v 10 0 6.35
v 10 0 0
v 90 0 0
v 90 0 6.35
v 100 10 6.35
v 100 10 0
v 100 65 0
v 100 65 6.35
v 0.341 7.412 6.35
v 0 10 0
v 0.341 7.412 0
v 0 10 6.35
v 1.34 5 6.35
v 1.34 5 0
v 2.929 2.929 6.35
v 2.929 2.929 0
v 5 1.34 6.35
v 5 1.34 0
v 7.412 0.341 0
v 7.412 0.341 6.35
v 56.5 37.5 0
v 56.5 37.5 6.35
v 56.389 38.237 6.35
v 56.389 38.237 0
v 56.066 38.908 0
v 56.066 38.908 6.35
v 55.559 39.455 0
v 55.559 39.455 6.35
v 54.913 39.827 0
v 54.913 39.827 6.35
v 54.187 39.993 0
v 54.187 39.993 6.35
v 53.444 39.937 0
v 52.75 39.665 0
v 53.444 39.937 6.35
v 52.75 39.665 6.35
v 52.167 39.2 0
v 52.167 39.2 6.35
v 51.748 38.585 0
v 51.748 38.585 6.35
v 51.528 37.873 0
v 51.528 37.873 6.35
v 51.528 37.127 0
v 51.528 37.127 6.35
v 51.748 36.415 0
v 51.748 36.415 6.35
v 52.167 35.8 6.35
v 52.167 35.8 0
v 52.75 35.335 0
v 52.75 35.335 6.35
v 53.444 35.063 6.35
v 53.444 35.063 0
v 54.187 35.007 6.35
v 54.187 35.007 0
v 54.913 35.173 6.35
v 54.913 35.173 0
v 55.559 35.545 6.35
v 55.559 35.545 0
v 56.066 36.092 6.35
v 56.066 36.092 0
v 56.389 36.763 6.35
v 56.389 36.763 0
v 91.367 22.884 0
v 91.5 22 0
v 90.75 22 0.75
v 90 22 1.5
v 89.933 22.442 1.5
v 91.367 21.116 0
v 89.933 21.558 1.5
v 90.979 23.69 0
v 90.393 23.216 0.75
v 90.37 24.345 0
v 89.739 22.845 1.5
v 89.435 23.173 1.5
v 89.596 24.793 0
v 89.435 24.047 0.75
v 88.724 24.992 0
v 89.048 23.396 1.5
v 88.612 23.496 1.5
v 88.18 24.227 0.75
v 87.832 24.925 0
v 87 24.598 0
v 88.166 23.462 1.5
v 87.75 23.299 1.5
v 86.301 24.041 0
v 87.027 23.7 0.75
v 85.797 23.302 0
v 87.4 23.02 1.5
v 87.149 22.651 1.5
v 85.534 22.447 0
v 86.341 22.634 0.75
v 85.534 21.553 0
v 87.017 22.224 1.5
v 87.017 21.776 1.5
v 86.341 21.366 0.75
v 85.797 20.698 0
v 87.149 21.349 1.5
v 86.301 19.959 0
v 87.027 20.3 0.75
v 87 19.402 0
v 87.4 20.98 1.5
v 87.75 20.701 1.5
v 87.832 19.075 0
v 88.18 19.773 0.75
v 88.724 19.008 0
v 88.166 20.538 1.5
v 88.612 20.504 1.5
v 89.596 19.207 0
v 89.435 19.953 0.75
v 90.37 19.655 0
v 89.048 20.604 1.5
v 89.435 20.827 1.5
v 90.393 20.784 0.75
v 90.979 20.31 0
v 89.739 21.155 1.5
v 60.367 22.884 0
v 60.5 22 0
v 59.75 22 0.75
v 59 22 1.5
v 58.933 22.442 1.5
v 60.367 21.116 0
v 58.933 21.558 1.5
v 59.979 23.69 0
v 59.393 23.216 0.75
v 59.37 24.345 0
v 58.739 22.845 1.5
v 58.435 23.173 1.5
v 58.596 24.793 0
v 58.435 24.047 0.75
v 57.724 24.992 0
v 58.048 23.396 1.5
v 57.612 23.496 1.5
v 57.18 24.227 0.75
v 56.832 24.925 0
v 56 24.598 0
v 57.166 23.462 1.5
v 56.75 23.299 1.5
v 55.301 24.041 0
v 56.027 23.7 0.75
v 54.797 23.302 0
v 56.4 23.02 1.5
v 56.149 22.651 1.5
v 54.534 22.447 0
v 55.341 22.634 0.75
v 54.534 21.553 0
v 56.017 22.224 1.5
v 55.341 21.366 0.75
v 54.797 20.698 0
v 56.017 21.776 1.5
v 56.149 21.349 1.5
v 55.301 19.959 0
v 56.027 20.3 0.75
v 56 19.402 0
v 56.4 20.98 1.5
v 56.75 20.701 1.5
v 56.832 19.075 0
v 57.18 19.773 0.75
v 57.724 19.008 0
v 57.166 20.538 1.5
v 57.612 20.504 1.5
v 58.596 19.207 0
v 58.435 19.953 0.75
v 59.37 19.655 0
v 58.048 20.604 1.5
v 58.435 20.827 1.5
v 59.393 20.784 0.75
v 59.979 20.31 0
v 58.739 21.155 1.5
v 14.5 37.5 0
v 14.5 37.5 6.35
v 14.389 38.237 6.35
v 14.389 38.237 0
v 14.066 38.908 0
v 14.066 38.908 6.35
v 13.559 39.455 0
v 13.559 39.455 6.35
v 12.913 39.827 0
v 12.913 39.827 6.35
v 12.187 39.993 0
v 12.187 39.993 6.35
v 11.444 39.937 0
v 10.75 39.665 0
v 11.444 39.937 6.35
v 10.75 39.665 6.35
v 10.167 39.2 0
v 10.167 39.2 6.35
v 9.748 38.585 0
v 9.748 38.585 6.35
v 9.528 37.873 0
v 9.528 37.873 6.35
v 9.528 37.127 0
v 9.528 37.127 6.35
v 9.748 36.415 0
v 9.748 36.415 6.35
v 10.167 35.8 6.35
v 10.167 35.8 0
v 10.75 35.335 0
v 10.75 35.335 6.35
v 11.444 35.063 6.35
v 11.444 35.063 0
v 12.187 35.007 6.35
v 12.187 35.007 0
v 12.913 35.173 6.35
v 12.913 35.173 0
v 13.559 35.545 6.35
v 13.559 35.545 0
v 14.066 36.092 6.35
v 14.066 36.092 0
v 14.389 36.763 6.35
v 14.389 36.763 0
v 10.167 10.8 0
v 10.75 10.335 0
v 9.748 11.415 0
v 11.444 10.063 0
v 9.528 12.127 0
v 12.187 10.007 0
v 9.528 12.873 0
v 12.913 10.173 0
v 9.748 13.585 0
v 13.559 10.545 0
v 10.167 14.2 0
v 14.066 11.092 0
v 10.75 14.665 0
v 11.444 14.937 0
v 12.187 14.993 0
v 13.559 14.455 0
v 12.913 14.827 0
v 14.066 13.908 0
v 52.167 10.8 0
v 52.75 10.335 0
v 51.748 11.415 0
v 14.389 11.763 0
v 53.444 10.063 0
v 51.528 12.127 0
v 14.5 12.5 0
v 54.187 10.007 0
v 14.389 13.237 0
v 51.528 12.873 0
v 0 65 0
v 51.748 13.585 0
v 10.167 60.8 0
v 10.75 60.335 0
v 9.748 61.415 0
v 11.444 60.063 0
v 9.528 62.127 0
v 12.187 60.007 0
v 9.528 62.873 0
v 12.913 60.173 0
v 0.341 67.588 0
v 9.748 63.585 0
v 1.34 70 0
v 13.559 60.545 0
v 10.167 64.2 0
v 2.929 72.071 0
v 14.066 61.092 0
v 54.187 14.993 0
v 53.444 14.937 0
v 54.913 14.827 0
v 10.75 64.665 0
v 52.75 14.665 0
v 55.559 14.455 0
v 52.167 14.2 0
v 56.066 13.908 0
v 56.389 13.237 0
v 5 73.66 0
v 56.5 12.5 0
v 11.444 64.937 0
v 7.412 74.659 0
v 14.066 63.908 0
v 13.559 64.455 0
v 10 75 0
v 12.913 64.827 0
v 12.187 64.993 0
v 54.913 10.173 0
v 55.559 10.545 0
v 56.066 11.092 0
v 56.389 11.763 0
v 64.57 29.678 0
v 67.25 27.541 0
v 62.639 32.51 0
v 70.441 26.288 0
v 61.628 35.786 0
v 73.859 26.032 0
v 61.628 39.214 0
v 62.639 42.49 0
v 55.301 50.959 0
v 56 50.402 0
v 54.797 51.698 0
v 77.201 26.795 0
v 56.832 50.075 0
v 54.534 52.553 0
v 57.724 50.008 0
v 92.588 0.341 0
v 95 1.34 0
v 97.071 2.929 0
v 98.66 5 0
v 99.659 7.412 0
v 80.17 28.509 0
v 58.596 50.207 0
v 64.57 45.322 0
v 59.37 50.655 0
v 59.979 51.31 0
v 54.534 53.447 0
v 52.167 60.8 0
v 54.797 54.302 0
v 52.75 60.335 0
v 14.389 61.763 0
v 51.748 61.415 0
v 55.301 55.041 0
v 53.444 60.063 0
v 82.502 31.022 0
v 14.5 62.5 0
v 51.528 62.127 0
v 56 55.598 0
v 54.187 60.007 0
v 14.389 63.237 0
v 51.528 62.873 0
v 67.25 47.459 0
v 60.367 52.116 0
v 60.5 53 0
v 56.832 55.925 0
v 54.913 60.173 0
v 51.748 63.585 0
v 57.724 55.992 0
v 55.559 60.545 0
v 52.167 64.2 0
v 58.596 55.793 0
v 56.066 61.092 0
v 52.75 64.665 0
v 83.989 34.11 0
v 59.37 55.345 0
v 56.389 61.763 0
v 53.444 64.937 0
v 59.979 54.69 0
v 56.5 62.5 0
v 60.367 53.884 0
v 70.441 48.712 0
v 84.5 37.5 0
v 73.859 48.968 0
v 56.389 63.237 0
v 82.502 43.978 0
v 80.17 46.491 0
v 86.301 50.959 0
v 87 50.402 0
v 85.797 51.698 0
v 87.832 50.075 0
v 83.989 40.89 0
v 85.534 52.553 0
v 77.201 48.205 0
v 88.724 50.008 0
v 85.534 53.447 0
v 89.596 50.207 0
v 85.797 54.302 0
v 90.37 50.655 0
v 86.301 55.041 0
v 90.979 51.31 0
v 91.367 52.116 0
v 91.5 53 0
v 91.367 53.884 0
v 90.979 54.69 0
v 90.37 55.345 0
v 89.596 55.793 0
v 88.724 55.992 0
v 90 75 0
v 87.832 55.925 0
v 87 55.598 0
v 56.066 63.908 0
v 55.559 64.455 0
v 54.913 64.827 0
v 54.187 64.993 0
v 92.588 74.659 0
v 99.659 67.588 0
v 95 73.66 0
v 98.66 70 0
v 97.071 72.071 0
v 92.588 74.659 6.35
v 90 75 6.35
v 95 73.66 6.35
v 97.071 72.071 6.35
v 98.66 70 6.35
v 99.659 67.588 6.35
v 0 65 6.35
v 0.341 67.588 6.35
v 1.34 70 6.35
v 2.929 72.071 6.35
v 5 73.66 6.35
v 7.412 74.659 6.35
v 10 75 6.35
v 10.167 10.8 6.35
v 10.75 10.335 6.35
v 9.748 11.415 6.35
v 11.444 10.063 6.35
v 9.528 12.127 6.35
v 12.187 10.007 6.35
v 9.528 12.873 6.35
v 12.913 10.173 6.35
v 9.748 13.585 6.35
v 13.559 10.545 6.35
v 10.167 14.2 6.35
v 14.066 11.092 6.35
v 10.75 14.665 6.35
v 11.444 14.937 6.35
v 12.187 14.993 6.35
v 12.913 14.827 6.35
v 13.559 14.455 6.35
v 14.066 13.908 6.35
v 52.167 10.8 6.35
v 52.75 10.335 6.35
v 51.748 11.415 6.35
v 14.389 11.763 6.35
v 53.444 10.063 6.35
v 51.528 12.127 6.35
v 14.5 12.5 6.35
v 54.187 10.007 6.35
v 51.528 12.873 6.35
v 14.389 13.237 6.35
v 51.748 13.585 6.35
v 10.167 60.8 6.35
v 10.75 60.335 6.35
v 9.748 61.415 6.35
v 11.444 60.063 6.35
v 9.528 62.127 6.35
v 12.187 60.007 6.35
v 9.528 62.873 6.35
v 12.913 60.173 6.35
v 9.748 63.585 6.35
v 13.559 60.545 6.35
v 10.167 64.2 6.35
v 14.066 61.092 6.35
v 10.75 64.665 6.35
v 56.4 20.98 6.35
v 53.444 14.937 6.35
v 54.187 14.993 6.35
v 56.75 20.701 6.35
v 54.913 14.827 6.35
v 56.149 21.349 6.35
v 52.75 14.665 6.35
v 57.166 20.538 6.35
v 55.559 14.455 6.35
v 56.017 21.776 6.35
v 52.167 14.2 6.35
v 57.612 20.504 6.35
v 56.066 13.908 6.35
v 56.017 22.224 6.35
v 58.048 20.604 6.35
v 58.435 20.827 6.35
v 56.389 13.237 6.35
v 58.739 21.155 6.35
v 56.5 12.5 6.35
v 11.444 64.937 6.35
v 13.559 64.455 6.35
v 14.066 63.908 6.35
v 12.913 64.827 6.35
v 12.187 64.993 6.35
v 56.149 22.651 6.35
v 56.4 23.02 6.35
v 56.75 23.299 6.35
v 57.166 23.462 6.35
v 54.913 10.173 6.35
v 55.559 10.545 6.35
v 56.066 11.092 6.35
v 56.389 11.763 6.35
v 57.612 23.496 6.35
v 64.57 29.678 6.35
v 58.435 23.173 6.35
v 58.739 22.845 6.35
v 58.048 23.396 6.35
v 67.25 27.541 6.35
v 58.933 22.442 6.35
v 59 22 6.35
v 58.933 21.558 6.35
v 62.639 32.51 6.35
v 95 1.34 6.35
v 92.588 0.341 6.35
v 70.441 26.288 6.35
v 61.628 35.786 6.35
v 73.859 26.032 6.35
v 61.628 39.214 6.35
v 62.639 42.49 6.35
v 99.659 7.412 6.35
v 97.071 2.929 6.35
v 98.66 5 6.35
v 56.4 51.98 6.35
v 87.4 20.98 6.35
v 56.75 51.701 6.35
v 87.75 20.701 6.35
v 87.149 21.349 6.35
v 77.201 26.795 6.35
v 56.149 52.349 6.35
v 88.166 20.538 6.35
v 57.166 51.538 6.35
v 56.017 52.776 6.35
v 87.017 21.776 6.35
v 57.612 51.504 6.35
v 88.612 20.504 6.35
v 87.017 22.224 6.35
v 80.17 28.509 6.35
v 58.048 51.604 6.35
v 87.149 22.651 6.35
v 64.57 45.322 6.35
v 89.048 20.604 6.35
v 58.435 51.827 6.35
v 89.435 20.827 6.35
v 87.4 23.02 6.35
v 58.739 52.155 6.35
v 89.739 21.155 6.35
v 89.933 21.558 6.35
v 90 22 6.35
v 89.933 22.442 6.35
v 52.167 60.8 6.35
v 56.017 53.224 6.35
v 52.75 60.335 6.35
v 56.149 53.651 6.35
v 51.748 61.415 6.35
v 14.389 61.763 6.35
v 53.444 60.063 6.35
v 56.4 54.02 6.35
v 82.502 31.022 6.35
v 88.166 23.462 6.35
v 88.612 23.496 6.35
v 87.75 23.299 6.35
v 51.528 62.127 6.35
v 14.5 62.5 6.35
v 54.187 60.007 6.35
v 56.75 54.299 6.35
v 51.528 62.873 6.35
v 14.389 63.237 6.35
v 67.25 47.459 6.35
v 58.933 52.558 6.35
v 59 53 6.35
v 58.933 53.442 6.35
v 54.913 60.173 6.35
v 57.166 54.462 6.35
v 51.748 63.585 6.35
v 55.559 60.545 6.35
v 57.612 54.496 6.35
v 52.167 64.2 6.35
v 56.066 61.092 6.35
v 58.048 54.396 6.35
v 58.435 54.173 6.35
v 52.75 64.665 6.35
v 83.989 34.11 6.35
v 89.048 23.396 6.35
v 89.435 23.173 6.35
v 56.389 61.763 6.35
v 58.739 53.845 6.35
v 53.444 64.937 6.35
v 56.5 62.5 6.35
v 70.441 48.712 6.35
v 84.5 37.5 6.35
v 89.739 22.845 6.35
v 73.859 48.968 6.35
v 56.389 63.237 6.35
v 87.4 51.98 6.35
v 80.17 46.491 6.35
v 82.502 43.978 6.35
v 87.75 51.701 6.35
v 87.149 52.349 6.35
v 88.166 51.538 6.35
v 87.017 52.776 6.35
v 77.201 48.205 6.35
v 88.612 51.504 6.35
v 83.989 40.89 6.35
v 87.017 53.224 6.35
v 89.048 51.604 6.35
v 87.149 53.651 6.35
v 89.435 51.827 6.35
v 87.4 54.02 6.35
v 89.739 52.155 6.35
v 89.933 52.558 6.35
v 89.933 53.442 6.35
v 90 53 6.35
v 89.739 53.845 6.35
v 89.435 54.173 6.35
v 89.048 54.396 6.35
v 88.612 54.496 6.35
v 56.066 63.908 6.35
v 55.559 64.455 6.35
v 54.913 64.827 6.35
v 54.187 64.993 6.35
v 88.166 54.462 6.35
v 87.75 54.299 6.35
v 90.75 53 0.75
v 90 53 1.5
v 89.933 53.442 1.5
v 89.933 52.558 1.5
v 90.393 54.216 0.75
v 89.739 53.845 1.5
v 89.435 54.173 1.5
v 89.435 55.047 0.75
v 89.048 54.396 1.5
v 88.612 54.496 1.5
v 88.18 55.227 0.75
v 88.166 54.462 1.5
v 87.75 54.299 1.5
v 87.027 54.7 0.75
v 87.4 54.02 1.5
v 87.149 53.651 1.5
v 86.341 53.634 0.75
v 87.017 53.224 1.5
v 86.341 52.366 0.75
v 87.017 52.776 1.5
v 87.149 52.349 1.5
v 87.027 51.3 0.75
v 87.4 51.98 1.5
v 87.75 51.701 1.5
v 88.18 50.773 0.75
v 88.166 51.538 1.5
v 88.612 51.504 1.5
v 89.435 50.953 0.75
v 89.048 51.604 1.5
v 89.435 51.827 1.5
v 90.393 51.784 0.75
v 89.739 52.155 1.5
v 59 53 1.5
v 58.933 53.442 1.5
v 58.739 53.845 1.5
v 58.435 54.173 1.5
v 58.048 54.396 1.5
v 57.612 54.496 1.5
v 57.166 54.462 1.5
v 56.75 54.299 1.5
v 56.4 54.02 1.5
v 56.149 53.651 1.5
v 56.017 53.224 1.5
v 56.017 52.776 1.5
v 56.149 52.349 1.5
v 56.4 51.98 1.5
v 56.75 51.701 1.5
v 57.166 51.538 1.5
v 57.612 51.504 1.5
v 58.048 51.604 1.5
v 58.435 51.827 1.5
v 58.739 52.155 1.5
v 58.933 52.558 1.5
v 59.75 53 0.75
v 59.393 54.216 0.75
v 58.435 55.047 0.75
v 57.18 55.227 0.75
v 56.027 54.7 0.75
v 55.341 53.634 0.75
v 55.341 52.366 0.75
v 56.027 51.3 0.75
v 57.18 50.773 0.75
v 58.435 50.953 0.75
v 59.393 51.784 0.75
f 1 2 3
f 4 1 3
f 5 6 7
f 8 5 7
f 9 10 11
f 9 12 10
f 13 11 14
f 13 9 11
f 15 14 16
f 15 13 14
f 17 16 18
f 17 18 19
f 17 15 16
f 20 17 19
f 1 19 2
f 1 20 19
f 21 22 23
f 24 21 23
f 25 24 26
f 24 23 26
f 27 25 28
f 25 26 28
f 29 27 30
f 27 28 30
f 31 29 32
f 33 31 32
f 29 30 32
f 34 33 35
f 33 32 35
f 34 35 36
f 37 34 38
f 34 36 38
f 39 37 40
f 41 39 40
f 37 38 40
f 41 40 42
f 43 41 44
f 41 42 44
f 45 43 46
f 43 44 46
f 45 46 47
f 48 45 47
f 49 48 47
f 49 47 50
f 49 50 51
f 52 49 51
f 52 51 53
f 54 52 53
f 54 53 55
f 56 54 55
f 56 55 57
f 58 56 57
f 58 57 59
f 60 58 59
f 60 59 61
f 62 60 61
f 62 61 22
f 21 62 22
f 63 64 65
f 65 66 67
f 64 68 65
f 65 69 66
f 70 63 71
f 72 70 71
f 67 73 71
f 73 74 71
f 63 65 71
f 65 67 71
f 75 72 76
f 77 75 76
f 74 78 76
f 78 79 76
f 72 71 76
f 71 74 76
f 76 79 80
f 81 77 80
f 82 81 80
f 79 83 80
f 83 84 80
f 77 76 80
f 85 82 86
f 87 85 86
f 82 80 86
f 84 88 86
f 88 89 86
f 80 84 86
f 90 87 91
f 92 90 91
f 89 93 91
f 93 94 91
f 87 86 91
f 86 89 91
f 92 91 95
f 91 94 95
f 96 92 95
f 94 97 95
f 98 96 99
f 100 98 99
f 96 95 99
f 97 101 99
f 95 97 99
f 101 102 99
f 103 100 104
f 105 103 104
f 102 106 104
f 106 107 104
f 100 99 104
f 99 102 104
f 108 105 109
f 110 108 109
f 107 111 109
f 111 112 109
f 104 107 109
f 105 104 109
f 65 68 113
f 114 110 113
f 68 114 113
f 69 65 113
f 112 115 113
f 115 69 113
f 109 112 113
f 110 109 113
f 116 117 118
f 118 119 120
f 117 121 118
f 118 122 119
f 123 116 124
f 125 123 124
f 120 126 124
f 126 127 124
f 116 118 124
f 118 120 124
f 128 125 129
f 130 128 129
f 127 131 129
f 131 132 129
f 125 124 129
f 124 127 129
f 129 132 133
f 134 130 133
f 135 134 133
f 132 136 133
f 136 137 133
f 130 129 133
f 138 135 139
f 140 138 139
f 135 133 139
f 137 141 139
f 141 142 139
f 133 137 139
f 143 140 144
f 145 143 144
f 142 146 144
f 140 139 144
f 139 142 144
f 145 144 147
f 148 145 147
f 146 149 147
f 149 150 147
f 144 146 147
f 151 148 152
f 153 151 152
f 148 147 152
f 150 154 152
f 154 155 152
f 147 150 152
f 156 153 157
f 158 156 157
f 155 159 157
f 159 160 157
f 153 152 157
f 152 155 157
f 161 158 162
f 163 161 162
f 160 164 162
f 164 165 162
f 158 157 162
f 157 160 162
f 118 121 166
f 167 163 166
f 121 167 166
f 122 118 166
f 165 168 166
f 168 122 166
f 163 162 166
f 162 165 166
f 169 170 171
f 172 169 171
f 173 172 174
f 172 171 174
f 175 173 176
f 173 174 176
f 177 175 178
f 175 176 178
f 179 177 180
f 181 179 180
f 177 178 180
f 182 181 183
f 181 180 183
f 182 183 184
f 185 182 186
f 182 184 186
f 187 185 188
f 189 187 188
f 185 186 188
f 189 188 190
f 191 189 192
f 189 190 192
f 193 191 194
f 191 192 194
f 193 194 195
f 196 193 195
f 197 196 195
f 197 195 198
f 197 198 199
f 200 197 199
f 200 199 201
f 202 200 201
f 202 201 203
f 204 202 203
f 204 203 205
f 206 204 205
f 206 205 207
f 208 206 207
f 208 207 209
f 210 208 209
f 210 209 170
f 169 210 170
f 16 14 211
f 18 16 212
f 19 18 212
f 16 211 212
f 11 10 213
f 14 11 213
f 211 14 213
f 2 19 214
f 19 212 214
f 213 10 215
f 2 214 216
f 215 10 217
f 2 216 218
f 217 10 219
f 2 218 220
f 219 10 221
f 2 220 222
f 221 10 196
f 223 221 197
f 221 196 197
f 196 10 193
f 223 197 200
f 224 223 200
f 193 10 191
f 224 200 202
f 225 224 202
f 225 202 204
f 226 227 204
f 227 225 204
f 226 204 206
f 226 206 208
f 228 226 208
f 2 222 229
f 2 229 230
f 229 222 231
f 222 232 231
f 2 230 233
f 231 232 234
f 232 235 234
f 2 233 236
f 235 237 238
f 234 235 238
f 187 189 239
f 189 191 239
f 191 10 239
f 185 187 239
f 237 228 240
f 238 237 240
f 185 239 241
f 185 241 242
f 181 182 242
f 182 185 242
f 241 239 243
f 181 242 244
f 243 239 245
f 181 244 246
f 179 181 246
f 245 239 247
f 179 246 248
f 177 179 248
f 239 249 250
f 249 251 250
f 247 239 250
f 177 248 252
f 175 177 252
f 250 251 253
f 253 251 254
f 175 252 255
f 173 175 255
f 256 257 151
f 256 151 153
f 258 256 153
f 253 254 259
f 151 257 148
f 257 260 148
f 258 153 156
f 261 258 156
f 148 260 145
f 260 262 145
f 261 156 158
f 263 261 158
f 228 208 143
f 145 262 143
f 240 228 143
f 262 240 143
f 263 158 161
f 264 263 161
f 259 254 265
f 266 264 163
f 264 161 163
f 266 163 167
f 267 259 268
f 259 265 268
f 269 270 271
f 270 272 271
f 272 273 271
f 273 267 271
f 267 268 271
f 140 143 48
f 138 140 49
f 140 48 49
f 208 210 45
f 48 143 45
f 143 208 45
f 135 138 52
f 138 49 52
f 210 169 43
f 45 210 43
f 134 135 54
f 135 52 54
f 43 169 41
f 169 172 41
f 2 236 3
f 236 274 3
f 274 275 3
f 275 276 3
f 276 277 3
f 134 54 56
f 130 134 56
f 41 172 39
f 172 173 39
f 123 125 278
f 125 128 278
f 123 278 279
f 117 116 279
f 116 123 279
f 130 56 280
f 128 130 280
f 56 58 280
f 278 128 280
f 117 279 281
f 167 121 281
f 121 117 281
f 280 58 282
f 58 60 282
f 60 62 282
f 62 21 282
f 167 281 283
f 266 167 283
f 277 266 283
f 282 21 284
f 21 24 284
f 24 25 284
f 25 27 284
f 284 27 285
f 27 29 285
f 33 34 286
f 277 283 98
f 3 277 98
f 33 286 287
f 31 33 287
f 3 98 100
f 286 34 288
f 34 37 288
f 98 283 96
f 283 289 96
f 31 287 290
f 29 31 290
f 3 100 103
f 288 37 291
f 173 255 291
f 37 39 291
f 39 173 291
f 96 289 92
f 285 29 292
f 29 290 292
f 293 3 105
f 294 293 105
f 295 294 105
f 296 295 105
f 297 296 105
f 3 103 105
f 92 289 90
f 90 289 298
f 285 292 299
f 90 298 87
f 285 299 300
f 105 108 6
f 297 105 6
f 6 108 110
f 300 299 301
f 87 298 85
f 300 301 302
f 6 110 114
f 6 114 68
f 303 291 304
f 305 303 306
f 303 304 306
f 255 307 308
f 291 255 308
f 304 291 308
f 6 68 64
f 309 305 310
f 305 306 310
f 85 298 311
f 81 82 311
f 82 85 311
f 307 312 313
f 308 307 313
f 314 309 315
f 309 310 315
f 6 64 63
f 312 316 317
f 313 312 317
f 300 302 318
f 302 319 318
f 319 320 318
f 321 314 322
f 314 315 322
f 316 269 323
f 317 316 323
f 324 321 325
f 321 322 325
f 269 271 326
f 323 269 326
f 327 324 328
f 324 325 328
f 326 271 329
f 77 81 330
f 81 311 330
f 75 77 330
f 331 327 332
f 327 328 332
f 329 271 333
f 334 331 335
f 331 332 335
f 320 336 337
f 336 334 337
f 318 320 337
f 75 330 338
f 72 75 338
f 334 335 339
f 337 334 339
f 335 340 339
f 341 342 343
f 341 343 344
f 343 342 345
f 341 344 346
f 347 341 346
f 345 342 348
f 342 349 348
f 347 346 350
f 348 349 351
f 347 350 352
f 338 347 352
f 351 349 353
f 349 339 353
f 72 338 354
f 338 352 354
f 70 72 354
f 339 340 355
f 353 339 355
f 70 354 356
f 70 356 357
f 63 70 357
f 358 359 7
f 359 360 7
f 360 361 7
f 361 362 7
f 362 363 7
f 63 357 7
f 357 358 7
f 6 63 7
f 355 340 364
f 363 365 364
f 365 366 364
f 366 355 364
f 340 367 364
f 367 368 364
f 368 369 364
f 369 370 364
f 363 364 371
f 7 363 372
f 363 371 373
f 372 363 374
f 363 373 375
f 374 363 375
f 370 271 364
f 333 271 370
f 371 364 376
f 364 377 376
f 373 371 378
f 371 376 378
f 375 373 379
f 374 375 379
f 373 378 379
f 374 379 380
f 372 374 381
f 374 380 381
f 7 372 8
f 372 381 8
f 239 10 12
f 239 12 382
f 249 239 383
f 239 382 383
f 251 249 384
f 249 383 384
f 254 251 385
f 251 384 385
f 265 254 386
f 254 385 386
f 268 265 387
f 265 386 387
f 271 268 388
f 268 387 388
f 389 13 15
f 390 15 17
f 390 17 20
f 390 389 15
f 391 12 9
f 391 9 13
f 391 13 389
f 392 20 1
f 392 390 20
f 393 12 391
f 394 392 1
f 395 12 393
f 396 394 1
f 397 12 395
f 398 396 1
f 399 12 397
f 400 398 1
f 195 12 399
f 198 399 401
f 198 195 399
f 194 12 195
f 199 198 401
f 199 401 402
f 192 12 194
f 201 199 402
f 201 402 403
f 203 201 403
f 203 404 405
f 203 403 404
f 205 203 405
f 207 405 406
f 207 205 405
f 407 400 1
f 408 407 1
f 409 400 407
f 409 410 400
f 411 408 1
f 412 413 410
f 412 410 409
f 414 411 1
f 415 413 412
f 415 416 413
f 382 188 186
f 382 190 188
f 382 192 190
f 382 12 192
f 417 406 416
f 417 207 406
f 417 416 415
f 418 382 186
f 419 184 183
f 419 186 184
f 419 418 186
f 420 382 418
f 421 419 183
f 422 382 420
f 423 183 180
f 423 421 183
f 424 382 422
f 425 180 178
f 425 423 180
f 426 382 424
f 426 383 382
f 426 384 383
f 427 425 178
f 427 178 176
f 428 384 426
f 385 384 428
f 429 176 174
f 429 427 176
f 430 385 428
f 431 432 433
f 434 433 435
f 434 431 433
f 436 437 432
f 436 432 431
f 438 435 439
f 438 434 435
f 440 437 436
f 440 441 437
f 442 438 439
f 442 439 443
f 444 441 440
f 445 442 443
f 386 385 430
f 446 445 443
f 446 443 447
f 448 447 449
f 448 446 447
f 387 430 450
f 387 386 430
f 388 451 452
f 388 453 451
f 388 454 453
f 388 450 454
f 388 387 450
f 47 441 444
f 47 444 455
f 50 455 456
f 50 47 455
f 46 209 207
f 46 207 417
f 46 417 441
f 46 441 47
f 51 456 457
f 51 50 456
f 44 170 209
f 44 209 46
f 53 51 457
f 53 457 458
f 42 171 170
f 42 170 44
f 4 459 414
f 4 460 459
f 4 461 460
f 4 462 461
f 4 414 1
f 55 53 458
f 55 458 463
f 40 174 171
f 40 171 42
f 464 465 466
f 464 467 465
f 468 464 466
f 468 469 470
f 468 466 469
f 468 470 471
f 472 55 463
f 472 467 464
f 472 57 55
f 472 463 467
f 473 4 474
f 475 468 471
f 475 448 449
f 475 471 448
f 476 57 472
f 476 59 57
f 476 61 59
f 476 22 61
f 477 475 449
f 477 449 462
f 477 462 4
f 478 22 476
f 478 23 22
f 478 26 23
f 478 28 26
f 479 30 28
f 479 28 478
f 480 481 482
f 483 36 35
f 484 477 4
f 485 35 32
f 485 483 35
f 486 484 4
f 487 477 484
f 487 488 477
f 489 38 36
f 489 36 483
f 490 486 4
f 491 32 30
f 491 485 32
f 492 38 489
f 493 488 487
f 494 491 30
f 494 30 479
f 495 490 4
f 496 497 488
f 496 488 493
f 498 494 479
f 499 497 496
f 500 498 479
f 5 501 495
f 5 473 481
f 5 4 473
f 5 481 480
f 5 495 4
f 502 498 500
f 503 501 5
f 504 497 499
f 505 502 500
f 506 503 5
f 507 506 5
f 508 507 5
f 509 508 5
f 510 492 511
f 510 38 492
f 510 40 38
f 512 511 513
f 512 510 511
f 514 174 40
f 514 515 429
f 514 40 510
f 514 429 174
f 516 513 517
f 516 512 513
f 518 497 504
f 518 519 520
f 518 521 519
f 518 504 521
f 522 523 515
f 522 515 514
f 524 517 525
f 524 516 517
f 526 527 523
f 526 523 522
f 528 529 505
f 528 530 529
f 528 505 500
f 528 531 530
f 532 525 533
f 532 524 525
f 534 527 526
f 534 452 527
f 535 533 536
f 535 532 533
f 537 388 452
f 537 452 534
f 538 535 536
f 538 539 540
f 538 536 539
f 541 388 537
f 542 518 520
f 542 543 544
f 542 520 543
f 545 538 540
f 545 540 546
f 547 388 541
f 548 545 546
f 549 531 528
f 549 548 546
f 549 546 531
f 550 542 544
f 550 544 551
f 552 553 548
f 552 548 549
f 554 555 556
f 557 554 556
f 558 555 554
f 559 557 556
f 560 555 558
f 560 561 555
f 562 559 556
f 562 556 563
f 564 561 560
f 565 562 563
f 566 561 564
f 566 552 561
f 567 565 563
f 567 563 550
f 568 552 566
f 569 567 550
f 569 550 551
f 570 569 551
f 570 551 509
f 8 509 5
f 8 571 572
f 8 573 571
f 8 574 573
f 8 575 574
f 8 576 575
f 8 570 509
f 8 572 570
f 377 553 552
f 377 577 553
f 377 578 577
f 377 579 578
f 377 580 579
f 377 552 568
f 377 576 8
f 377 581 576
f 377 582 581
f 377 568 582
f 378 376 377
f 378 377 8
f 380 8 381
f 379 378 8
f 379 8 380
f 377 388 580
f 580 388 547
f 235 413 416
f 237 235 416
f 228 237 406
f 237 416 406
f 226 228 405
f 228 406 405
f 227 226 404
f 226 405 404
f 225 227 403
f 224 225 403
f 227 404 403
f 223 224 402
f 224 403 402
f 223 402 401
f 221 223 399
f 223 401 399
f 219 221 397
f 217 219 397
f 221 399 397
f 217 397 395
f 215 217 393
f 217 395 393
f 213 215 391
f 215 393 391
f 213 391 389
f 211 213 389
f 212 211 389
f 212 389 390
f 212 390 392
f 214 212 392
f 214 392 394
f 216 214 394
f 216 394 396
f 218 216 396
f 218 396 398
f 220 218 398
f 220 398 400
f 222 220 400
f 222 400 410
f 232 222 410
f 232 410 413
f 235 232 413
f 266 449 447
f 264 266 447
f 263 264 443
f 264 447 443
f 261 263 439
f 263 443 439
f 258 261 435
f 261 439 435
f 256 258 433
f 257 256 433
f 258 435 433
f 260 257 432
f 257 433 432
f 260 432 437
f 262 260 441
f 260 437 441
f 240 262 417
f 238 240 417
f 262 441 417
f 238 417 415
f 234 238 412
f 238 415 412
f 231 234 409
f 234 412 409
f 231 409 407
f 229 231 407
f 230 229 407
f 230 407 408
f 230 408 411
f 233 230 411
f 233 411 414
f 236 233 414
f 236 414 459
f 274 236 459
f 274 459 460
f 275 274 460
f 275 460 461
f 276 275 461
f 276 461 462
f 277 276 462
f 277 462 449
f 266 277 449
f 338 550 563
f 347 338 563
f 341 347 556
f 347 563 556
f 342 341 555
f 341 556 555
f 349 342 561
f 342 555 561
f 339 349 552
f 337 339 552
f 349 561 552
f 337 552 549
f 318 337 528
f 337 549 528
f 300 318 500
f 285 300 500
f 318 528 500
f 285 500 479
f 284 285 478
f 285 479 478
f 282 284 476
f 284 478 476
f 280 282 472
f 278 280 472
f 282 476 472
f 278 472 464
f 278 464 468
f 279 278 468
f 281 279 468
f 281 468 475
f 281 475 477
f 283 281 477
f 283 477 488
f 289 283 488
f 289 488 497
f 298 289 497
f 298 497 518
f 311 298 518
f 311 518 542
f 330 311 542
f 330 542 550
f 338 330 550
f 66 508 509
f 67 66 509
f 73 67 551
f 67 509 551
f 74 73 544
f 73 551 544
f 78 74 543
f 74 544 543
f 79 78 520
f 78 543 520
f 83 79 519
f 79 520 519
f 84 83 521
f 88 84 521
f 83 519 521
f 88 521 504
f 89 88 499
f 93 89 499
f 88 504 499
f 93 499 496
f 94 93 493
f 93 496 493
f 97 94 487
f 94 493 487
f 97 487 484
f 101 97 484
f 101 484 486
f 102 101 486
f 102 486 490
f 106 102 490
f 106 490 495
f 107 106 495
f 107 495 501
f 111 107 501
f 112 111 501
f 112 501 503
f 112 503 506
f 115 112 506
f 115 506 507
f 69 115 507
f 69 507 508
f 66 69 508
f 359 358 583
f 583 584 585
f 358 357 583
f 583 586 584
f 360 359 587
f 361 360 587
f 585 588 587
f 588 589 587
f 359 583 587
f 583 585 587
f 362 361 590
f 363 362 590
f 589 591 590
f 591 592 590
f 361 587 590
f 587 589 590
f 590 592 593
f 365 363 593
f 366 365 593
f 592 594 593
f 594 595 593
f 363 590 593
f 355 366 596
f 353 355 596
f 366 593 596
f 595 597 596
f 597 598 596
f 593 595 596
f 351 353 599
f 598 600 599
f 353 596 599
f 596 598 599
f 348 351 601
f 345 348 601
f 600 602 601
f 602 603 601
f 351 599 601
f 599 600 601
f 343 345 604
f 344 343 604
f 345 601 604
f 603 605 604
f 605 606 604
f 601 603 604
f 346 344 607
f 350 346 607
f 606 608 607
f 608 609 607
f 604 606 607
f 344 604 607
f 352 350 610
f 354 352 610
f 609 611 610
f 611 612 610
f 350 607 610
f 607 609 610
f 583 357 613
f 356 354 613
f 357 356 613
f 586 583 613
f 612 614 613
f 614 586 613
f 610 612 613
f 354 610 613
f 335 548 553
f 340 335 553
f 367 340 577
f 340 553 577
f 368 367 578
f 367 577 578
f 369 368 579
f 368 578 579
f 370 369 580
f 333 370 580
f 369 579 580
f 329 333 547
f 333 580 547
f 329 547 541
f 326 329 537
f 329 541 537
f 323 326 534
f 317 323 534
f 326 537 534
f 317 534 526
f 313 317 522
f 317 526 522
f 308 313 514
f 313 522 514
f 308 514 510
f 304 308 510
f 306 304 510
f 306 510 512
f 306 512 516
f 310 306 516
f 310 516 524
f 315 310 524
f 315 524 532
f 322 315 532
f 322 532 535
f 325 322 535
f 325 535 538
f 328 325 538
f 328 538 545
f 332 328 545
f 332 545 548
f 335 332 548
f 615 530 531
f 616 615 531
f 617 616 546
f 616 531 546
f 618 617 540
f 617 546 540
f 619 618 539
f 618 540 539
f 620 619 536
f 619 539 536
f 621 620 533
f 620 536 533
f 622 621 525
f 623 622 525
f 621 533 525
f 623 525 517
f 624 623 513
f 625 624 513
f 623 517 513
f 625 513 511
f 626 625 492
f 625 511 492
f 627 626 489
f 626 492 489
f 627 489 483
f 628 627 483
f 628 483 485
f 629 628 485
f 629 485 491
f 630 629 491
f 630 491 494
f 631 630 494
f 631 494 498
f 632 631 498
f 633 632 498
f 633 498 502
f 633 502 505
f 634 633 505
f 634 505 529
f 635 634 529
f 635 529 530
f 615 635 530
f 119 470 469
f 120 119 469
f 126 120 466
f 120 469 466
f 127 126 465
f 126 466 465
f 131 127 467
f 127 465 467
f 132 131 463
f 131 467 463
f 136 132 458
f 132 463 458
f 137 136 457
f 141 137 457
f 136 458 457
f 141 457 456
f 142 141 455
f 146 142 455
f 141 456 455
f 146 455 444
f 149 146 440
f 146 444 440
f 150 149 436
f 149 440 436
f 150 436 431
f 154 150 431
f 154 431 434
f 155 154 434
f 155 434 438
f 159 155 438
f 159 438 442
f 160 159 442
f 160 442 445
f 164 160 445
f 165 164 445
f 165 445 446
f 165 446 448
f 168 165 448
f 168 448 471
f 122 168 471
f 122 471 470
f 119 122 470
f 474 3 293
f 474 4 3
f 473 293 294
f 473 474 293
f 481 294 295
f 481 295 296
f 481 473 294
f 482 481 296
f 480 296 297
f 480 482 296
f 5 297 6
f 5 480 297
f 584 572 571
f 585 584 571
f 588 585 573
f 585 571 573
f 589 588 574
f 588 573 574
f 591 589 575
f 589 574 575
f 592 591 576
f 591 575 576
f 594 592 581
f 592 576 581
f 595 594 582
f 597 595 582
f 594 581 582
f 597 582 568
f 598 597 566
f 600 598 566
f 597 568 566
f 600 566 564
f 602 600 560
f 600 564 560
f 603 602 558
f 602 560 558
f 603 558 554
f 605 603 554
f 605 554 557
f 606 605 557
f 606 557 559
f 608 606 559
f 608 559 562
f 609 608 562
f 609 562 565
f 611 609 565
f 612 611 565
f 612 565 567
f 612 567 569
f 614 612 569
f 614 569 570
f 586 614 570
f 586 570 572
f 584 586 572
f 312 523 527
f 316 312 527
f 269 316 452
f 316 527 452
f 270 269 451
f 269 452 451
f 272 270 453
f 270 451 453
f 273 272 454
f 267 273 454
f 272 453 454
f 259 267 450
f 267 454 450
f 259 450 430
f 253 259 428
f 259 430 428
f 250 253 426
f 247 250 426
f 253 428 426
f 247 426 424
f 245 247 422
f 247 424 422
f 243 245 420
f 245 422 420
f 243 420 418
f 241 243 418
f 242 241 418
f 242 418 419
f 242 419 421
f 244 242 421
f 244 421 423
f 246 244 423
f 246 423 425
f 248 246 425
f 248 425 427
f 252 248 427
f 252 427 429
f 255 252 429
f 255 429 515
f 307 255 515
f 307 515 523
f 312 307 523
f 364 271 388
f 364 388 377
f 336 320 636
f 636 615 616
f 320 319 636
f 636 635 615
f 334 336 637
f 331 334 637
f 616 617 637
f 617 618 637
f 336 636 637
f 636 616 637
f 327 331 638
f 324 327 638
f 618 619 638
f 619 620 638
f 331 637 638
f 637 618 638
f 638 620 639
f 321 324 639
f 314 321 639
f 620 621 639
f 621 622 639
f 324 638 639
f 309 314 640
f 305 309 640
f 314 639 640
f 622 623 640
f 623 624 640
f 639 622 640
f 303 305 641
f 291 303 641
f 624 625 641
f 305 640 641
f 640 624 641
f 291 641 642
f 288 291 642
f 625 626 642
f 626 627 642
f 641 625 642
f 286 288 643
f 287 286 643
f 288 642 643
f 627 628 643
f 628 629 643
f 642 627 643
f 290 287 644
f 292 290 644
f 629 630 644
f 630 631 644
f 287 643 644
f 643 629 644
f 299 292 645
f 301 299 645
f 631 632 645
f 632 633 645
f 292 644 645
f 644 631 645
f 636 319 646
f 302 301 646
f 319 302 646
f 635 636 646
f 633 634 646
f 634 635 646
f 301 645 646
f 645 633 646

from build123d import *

# Parameters (mm, degrees)
SKETCH1_W             = 100
SKETCH1_H             = 75
PLATE_DEPTH           = 6.35
SKETCH2_R             = 2.5
CUT_IDLER_HOLES_DEPTH = 126.161186076
SKETCH3_R             = 1.5
SKETCH3_R_2           = 11.5
CUT_MOTOR_HOLES_DEPTH = 126.161186076
CHAMFER1_SIZE         = 1.5
FILLET1_R             = 10


with BuildPart() as part:
    # Sketch1 → plate (new body)
    with BuildSketch(Plane.XY):
        with Locations((50, 37.5)):
            Rectangle(SKETCH1_W, SKETCH1_H)
    extrude(amount=PLATE_DEPTH)

    # Sketch2 → cut idler holes (cut, through all)
    with BuildSketch(Plane.XY.offset(6.35)):
        with Locations((12, 62.5)):
            Circle(SKETCH2_R)
        with Locations((12, 12.5)):
            Circle(SKETCH2_R)
        with Locations((54, 37.5)):
            Circle(SKETCH2_R)
        with Locations((54, 62.5)):
            Circle(SKETCH2_R)
        with Locations((12, 37.5)):
            Circle(SKETCH2_R)
        with Locations((54, 12.5)):
            Circle(SKETCH2_R)
    extrude(amount=-CUT_IDLER_HOLES_DEPTH, mode=Mode.SUBTRACT)

    # Sketch3 → cut motor holes (cut, through all)
    with BuildSketch(Plane.XY.offset(6.35)):
        with Locations((57.5, 53)):
            Circle(SKETCH3_R)
        with Locations((88.5, 53)):
            Circle(SKETCH3_R)
        with Locations((88.5, 22)):
            Circle(SKETCH3_R)
        with Locations((57.5, 22)):
            Circle(SKETCH3_R)
        with Locations((73, 37.5)):
            Circle(SKETCH3_R_2)
    extrude(amount=-CUT_MOTOR_HOLES_DEPTH, mode=Mode.SUBTRACT)

    # Chamfer1
    chamfer1_edges = [part.edges().sort_by_distance(p)[0] for p in [
        (56, 53, 0),
        (87, 22, 0),
        (56, 22, 0),
        (87, 53, 0),
    ]]
    chamfer(chamfer1_edges, length=CHAMFER1_SIZE)

    # Fillet1
    fillet1_edges = [part.edges().sort_by_distance(p)[0] for p in [
        (0, 75, 3.175),
        (100, 75, 3.175),
        (100, 0, 3.175),
        (0, 0, 3.175),
    ]]
    fillet(fillet1_edges, radius=FILLET1_R)


solid = part.part
